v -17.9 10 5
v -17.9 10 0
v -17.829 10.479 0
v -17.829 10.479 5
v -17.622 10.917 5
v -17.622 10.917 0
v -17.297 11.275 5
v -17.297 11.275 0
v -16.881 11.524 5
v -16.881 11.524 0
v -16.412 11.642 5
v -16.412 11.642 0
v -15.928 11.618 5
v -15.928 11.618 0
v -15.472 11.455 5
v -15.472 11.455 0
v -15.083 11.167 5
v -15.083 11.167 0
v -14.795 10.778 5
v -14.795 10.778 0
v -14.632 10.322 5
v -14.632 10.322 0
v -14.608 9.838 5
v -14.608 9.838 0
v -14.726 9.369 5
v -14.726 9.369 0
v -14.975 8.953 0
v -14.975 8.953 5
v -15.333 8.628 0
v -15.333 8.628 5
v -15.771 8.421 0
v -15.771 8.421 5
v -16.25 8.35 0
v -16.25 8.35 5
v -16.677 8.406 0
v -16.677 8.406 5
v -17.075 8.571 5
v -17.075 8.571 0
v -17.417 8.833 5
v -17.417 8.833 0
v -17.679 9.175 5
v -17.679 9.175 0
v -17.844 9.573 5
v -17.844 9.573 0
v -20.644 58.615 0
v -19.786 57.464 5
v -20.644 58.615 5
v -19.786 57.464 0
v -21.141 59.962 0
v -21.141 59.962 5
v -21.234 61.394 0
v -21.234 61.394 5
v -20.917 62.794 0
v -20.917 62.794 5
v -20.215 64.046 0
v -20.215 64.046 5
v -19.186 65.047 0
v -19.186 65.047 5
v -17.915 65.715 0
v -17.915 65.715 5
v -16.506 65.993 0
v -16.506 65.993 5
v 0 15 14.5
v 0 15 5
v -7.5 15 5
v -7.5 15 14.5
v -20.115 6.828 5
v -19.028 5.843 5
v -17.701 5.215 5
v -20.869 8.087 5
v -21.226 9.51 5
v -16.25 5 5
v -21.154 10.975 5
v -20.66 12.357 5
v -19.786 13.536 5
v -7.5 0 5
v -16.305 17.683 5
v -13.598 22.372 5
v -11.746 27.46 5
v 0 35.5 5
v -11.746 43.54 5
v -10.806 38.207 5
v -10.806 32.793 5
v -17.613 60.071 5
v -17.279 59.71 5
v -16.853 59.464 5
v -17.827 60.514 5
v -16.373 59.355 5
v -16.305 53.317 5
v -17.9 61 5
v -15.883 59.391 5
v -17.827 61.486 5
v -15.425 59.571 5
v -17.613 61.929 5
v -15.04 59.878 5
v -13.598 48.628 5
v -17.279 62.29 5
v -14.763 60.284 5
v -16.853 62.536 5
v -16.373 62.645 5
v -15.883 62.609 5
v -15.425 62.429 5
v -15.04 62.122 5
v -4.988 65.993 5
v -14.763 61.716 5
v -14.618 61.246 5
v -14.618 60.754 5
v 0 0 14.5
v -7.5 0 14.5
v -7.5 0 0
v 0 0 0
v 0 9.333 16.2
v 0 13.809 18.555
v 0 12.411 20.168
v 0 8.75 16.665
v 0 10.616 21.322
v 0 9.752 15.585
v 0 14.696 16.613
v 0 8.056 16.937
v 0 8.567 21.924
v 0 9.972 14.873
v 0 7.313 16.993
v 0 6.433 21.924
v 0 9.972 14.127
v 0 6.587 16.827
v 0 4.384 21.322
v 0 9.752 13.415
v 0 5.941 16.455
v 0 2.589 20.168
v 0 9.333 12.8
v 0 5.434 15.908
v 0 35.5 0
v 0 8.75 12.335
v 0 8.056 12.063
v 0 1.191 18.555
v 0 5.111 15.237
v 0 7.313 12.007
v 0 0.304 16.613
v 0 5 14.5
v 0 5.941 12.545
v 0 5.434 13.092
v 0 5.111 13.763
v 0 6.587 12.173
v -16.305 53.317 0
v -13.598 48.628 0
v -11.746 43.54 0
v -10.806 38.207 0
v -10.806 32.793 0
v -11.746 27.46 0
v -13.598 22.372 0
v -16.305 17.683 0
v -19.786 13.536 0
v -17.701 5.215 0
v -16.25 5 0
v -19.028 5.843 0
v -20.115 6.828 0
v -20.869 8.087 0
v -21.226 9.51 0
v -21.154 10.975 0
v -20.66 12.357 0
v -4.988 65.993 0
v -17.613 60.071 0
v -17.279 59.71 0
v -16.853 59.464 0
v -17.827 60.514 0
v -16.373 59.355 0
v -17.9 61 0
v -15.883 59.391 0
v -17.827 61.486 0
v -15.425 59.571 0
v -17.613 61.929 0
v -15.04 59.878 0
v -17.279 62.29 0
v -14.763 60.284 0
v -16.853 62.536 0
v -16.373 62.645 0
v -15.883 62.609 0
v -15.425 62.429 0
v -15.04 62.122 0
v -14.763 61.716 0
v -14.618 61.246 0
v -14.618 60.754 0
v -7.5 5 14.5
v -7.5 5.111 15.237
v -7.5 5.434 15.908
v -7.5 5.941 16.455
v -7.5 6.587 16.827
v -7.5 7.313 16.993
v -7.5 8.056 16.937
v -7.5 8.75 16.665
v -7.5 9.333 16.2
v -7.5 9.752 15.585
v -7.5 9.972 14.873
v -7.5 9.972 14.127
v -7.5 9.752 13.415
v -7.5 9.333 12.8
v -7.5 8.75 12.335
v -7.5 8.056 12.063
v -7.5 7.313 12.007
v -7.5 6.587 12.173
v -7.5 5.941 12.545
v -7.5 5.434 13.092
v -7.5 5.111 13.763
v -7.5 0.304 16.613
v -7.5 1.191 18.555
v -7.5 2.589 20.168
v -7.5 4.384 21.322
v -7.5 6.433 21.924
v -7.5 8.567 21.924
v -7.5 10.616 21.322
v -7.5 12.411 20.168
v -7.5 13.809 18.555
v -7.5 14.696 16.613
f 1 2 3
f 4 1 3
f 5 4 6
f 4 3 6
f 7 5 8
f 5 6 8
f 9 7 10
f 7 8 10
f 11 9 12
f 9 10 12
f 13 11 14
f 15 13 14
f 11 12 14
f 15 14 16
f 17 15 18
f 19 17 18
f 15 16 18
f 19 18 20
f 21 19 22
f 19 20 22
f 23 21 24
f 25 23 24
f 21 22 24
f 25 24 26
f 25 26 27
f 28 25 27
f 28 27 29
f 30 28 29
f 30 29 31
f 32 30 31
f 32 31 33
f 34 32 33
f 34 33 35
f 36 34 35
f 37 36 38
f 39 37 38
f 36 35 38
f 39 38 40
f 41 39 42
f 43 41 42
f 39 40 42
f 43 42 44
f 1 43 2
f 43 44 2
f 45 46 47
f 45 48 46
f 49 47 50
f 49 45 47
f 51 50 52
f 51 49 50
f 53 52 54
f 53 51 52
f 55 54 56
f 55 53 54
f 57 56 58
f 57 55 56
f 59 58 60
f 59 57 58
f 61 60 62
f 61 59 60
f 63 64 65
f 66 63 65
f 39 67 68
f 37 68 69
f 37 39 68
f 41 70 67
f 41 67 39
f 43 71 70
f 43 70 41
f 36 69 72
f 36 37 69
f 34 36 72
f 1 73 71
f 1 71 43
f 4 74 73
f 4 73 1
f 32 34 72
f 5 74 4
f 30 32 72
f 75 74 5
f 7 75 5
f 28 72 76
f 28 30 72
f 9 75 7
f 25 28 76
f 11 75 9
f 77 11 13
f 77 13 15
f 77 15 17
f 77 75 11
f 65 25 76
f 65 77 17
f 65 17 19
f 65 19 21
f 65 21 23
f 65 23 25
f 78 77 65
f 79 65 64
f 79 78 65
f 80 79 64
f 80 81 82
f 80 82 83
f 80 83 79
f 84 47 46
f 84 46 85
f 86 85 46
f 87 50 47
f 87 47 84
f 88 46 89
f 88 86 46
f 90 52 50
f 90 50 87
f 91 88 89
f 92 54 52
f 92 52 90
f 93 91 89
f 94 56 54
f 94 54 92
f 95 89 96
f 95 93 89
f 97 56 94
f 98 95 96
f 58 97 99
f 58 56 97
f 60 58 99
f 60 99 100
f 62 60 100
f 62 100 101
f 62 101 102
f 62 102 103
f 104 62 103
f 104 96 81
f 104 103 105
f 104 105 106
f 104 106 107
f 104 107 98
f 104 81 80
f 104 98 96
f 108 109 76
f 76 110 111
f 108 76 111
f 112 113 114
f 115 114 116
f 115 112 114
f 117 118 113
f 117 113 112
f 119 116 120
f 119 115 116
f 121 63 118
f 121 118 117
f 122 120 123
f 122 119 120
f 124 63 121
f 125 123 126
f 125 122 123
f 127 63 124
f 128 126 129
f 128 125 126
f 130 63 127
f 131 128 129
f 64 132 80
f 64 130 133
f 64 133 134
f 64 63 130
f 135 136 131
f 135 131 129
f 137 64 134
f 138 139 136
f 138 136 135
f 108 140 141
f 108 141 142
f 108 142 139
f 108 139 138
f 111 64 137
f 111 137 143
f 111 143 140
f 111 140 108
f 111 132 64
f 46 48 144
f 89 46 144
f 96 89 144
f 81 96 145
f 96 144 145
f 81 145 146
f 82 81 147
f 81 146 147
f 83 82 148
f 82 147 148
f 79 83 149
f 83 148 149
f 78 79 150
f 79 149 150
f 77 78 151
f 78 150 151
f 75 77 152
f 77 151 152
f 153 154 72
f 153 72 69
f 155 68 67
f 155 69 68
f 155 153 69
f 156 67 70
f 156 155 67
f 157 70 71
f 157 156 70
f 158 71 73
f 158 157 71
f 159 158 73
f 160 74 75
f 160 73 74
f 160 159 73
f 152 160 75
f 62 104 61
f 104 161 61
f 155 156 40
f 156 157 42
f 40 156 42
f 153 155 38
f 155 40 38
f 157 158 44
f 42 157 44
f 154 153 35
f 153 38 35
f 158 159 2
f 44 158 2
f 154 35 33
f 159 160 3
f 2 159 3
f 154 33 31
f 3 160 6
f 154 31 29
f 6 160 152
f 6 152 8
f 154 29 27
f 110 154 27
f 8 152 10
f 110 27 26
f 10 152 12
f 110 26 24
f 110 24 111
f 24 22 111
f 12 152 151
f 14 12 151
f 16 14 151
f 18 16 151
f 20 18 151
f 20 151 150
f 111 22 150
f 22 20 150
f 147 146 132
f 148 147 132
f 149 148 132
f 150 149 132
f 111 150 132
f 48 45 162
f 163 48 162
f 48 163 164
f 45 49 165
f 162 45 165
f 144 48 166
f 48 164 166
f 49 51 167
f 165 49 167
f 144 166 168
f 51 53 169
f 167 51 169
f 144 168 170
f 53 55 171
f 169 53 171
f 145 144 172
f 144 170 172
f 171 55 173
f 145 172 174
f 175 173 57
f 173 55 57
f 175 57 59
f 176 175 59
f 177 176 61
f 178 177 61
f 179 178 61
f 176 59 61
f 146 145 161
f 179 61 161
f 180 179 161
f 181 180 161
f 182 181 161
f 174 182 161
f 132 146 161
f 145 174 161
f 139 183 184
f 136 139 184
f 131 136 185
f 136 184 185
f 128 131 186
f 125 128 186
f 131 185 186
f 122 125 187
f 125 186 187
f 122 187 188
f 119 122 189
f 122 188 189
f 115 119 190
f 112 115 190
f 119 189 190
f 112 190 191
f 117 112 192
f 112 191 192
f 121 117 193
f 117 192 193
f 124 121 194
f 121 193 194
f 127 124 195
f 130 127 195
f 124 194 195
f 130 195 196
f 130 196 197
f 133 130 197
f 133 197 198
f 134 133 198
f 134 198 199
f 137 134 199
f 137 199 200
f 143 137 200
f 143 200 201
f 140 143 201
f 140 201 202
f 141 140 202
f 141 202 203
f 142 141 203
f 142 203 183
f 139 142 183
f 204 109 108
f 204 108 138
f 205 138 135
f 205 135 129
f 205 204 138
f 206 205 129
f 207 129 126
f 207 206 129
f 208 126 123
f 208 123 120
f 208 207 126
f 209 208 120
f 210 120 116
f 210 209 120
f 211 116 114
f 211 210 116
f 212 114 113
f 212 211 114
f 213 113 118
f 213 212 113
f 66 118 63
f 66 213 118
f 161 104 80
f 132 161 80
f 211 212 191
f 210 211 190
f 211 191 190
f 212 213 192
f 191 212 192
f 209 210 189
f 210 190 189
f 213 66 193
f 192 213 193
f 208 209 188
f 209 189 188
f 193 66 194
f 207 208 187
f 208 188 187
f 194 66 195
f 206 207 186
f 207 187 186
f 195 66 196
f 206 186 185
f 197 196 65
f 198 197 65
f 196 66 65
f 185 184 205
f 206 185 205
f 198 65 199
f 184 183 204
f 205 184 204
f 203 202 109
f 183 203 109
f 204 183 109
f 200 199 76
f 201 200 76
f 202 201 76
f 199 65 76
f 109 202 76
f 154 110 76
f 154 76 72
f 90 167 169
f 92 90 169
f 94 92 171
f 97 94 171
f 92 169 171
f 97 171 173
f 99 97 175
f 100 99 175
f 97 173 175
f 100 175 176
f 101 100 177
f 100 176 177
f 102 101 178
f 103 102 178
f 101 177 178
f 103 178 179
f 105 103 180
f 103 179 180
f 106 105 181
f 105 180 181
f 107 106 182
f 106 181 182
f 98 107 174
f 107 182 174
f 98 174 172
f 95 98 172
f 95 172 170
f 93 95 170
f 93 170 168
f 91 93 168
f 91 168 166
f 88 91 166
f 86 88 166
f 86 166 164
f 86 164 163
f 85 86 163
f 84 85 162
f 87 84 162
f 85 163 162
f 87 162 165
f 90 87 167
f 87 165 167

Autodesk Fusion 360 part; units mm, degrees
sketch "Esquisse1" plane through (0, 0, 0) normal (0, 0, 1) x (1, 0, 0)
  circle A0 centre (16.25, 10) radius 1.65
  circle A1 centre (16.25, 61) radius 1.65
  circle A2 centre (67.25, 10) radius 1.95
  circle A3 centre (67.25, 61) radius 1.95
  line L0 (67.25, 61) -> (16.25, 10) construction
  line L1 (16.25, 61) -> (67.25, 10) construction
  circle A4 centre (41.75, 35.5) radius 30.5 construction
  circle A5 centre (16.25, 61) radius 5
  circle A6 centre (16.25, 10) radius 5
  arc A7 (19.7855, 57.4645) -> (19.7855, 13.5355) centre (41.75, 35.5) ccw
  line L2 (16.5063, 65.9934) -> (0, 65.9934)
  line L3 (0, 65.9934) -> (0, 0)
  line L4 (0, 0) -> (7.5, 0)
  line L5 (16.25, 10) -> (16.25, 5)
  line L6 (16.25, 5) -> (7.5, 0)
  line L7 (7.5, 0) -> (7.5, 15)
  line L8 (7.5, 15) -> (0, 15)
  dimension "d1" = 3.3
  dimension "d2" = 3.3
  dimension "d3" = 16.25
  dimension "d4" = 16.25
  dimension "d5" = 51
  dimension "d6" = 10
  dimension "d7" = 3.9
  dimension "d8" = 51
  dimension "d9" = 3.9
  dimension "d10" = 51
  dimension "d11" = 51
  dimension "d12" = 61
  dimension "d13" = 10
  dimension "d14" = 10
  dimension "d15" = 7.5
  dimension "d16" = 15
extrude "Extrusion1" add sketch "Esquisse1" along normal blind 22 contours L3 L4 L7 L8 makes body 1
extrude "Extrusion2" add sketch "Esquisse1" along normal blind 5 separate body contours A6 | A5 A6 A7 L2 L3 L6 L7 L8 | A5 L2 picked at (18.7618, 58.051) makes body 2
sketch "Esquisse2" plane through (0, 0, 0) normal (-1, 0, 0) x (0, -1, 0)
  line L0 (-15, 0) -> (0, 0)
  line L1 (0, 0) -> (0, 22)
  line L2 (0, 22) -> (-15, 22)
  line L3 (-15, 22) -> (-15, 0)
  circle A0 centre (-7.5, 14.5) radius 2.5
  arc A1 (0, 14.5) -> (-7.5, 22) centre (-7.5, 14.5) ccw
  arc A2 (-7.5, 22) -> (-15, 14.5) centre (-7.5, 14.5) ccw
  dimension "d21" = 5
  dimension "d22" = 7.5
  dimension "d23" = 7.5
extrude "Extrusion3" cut sketch "Esquisse2" against normal blind 8 contours L2 L3 A2 | L1 L2 A1 | A0 bodies 1
sketch "Esquisse3" plane through (0, 0, 5) normal (0, 0, 1) x (-1, 0, 0)
  circle A0 centre (-16.25, -61) radius 1.65
  circle A1 centre (-16.25, -10) radius 1.65
  arc A2 (-16.25, -5) -> (-19.7855, -13.5355) centre (-16.25, -10) ccw
  arc A3 (-19.7855, -57.4645) -> (-19.7855, -13.5355) centre (-41.75, -35.5) ccw
  arc A4 (-19.7855, -57.4645) -> (-16.5063, -65.9934) centre (-16.25, -61) ccw
  line L0 (-16.5063, -65.9934) -> (0, -65.9934)
  line L1 (0, -65.9934) -> (0, -15)
  line L2 (0, -15) -> (-7.5, -15)
  line L3 (-7.5, -15) -> (-7.5, 0)
  line L4 (-7.5, 0) -> (-16.25, -5)
  line L5 (0, -35.5) -> (-5, -66.0689)
  line L6 (-5, -66.0689) -> (0, -65.9934)
  line L7 (0, -35.5) -> (0, -65.9934)
  dimension "d27" = 5
extrude "Extrusion4" cut sketch "Esquisse3" against normal blind 10 contours L0 L1 L5 L7 bodies 2
mirror "Symétrie miroir2" about plane through (0, 65.9934, 0) normal (-1, 0, 0) of bodies 2 1 merged
sketch "Esquisse4" plane through (0, 0, 0) normal (0, 0, 1) x (1, 0, 0)
  line L0 (0, 0) -> (31.9819, 0)
  line L1 (31.9819, 0) -> (31.9819, 68.443)
  line L2 (31.9819, 68.443) -> (0, 68.443)
  line L3 (0, 68.443) -> (0, 0)
extrude "Extrusion5" cut sketch "Esquisse4" sketch "Esquisse1" along normal blind 30 of sketch 2 contours A5 A6 A7 L2 L3 L6 L7 L8 | L3 L4 L7 L8 | A5 L2 picked at (18.7618, 58.051) bodies 1 2
combine "Combiner1" operation add target body 1 tool bodies 2
equation "d3 = 14.3 mm + 1.95 mm"
